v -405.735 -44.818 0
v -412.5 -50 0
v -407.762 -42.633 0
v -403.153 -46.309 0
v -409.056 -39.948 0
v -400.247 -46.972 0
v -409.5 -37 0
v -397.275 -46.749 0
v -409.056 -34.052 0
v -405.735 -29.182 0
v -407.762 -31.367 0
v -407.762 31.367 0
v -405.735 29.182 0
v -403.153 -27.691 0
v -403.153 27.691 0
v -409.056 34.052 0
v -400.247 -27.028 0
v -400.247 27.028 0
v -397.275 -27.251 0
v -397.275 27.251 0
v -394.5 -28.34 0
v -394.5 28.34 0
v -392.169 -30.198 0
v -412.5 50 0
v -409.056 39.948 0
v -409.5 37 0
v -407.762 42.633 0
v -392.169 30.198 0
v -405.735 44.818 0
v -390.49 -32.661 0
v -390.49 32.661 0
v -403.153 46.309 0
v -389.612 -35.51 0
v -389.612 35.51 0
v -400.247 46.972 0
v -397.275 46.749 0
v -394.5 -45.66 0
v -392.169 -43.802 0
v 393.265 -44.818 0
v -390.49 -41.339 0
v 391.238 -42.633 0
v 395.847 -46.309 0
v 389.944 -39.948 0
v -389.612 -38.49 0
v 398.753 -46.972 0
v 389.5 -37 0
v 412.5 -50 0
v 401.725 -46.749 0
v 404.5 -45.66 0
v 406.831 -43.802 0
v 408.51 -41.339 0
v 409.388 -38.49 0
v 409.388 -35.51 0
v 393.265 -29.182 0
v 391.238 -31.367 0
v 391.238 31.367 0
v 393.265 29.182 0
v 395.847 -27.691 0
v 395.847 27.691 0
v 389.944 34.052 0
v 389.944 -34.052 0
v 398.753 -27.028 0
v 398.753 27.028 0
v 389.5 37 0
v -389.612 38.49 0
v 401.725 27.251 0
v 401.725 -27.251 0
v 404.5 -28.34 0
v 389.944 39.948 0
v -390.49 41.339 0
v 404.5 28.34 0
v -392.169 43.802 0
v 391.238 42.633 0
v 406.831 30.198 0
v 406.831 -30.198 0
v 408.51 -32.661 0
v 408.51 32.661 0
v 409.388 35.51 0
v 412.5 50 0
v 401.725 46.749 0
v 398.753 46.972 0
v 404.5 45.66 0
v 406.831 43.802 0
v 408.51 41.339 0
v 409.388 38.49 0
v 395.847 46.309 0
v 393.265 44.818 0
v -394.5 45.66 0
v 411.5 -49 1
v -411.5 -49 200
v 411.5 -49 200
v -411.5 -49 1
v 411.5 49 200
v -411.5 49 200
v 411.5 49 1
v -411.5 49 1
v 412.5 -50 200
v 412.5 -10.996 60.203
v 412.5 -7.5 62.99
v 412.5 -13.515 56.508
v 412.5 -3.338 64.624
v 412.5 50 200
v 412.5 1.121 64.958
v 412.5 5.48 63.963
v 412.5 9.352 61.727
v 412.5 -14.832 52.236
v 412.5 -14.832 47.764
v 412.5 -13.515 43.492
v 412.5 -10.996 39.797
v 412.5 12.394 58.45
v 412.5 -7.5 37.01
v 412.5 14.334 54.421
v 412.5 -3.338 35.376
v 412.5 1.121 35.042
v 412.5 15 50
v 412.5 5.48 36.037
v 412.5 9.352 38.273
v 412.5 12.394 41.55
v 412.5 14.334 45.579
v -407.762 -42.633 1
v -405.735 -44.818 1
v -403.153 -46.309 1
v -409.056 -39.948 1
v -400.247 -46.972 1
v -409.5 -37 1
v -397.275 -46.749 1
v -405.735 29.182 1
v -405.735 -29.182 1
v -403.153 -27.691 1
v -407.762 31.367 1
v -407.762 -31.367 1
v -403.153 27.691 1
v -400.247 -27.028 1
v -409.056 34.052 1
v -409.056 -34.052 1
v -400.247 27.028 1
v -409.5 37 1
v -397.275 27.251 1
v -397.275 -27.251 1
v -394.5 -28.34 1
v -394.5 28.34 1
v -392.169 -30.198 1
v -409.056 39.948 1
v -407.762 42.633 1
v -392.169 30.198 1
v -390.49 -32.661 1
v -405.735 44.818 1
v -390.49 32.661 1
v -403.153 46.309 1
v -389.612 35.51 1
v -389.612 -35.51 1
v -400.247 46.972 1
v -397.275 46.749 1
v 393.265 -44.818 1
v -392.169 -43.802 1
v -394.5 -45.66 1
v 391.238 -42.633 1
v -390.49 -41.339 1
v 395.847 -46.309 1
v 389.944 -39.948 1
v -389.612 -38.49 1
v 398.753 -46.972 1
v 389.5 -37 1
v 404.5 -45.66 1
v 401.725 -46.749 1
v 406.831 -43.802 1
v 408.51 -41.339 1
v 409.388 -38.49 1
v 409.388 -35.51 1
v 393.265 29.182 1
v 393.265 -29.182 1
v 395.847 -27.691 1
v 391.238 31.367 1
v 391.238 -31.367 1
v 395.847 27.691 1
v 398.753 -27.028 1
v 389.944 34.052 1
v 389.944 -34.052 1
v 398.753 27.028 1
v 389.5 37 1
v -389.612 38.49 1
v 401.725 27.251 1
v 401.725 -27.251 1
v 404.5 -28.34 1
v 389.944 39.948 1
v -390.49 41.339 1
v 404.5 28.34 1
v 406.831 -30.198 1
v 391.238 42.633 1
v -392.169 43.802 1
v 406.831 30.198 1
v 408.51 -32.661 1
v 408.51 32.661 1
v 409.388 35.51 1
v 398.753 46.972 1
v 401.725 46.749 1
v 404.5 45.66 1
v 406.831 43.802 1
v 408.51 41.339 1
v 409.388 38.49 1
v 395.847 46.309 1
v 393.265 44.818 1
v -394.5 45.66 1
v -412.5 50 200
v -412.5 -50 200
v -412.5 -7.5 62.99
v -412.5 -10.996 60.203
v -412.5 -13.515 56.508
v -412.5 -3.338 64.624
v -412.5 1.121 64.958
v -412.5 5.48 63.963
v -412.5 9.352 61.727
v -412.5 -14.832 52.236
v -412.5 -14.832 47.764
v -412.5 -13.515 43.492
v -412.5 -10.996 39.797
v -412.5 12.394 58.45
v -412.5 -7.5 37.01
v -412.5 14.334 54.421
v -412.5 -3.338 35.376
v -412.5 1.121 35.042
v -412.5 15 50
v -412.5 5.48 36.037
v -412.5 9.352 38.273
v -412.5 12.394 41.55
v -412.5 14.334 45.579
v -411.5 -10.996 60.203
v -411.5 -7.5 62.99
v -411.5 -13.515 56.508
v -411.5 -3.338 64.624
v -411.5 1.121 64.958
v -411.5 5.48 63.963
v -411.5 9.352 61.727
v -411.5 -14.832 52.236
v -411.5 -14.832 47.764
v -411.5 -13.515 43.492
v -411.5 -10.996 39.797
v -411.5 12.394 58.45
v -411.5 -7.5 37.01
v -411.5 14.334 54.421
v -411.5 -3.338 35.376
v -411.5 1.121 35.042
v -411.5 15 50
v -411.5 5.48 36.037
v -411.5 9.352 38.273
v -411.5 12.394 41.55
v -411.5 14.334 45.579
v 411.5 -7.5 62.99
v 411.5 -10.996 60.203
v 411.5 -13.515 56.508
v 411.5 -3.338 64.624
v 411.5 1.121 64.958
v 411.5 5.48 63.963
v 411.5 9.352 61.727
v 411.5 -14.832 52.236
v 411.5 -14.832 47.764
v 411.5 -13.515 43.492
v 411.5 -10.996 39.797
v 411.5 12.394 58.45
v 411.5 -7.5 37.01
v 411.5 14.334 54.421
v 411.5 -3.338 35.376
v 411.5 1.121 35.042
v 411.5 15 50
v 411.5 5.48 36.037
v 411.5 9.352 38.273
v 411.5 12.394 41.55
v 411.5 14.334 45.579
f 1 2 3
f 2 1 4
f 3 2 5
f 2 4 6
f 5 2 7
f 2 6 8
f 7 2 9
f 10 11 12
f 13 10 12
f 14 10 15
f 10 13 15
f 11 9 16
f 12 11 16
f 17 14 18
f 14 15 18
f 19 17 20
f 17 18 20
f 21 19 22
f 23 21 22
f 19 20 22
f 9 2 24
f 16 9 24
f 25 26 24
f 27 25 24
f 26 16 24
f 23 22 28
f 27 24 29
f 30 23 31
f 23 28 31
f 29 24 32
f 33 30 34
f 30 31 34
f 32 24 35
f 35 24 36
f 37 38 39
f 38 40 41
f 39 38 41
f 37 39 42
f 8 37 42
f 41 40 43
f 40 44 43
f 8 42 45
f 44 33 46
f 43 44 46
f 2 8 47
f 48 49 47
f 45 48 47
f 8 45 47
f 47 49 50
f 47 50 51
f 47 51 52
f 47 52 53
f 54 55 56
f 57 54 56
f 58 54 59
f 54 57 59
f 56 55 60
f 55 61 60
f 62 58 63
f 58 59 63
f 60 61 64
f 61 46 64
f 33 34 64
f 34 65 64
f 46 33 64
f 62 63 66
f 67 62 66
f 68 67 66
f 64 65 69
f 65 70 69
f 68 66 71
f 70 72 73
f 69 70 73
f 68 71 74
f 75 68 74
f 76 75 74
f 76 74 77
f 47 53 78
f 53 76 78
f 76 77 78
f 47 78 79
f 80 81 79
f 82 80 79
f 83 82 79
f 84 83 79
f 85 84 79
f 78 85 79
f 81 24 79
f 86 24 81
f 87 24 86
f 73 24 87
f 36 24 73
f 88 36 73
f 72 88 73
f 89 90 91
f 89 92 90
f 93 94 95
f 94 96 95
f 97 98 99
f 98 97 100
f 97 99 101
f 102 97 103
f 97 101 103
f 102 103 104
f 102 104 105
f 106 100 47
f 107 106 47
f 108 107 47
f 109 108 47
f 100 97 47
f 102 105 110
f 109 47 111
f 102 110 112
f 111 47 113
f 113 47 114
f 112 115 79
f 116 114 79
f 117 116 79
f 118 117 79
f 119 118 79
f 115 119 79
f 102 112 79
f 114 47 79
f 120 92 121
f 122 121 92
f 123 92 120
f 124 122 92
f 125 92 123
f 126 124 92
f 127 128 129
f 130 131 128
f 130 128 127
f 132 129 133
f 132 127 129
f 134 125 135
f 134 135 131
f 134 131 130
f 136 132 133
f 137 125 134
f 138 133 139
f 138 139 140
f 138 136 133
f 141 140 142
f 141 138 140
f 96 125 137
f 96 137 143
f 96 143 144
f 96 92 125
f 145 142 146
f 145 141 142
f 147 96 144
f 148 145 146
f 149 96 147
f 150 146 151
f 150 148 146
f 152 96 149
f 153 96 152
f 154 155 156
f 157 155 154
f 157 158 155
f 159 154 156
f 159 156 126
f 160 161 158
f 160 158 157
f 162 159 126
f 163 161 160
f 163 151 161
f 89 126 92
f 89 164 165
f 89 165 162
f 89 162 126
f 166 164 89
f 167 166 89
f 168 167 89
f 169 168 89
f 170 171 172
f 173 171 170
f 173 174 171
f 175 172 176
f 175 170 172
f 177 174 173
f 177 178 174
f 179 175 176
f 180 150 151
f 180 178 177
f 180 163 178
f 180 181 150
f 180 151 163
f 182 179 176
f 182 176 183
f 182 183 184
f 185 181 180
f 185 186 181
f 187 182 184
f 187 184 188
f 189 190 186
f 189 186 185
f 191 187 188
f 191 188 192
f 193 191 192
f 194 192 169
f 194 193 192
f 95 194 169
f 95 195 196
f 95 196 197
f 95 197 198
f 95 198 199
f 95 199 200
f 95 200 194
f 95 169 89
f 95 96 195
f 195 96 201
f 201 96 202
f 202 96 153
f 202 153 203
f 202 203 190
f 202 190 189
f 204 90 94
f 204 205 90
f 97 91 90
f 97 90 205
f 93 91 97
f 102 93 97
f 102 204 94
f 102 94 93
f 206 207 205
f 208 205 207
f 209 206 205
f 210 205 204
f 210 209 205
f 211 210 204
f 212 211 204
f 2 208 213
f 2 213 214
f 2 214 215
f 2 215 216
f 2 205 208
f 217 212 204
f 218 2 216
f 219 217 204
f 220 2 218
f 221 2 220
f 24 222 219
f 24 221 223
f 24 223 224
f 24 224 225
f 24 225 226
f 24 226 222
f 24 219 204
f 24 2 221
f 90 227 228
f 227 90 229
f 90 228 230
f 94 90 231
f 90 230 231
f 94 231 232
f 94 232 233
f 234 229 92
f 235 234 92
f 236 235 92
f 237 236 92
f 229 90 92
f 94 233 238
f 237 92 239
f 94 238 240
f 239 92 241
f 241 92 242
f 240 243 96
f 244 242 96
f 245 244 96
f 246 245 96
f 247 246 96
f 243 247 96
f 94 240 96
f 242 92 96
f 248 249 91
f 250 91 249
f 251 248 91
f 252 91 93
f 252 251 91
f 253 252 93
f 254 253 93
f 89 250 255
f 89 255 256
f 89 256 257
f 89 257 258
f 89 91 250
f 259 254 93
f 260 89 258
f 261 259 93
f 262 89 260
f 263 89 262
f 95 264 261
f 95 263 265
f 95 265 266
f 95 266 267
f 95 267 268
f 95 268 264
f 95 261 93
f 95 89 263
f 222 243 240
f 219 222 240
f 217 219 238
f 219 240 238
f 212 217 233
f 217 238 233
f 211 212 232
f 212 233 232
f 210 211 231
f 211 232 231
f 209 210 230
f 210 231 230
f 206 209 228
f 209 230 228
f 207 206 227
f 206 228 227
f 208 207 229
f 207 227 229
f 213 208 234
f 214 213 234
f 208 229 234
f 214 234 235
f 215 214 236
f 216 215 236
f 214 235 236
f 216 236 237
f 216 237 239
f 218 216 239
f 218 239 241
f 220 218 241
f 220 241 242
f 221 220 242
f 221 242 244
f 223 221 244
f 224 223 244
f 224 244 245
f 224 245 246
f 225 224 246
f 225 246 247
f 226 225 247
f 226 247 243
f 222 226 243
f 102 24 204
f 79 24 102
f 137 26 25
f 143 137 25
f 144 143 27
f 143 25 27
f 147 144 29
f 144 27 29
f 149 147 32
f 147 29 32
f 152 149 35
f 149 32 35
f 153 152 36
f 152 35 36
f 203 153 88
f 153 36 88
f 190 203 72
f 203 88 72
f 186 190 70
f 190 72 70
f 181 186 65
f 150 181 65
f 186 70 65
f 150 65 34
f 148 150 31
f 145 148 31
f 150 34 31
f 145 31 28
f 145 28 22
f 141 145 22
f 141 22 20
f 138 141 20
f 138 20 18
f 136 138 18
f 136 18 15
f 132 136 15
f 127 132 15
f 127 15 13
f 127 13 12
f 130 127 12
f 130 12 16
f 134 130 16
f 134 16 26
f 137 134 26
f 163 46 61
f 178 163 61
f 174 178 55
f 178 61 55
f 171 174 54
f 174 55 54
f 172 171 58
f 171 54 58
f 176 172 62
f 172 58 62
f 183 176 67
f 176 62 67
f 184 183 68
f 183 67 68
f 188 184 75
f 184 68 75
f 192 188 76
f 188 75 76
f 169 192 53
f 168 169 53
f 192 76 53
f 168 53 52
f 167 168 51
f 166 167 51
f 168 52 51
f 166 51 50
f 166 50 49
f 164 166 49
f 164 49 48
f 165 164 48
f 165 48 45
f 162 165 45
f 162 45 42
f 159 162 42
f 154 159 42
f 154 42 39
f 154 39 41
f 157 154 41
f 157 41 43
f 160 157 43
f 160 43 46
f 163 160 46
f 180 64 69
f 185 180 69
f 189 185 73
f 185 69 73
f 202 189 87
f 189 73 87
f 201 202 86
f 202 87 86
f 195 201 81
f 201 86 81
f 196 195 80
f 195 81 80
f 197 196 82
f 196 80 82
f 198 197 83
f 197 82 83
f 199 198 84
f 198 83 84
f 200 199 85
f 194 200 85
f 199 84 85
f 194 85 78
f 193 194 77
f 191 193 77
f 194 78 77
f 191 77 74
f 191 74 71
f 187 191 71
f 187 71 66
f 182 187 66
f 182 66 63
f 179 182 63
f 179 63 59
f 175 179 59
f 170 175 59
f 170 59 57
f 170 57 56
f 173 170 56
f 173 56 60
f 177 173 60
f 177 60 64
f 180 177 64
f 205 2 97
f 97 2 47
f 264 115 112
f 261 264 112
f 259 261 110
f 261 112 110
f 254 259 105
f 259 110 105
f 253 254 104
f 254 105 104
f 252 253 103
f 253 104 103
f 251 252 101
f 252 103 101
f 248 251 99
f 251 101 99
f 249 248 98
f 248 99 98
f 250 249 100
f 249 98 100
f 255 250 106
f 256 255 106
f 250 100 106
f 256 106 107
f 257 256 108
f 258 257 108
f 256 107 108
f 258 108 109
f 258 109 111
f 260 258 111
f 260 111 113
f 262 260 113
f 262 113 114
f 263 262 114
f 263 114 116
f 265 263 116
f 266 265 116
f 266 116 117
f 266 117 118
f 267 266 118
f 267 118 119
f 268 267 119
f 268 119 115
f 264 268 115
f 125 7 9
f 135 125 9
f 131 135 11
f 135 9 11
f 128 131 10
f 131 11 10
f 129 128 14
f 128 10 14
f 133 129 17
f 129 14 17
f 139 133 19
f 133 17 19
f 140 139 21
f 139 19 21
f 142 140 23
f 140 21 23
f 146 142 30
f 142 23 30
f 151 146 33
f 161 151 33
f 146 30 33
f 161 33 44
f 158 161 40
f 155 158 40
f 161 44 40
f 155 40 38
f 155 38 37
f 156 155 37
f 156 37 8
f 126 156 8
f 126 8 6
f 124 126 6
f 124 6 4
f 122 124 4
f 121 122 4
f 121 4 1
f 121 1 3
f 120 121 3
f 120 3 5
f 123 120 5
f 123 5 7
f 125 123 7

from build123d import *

# Parameters (mm, degrees)
F0_W     = 825
F0_H     = 100
F1_DEPTH = 200
F2_T     = -1
F5_D     = 20
F8_D     = 30


# Not quite as in the source:
# - the program builds the solid bodies; features that only make, move or delete a surface that nothing else refers to are left out


with BuildPart() as f1:
    # F0 (on Top) → F1 (new body)
    with BuildSketch(Plane.XY):
        Rectangle(F0_W, F0_H)
    extrude(amount=F1_DEPTH)

    # F2
    f2_openings = [f1.faces().sort_by_distance(p)[0] for p in [
        (0, 0, 200),
    ]]
    offset(amount=F2_T, openings=f2_openings)

    # F5 (through all)
    with Locations(Plane.XY.offset(1)):
        with Locations((399.5, 37), (399.5, -37), (-399.5, 37), (-399.5, -37)):
            Hole(F5_D / 2)

    # F8 (through all)
    with Locations(Plane(origin=(-412.5, 0, 0), x_dir=(0, -1, 0), z_dir=(-1, 0, 0))):
        with Locations((0, 50)):
            Hole(F8_D / 2)


solid = f1.part
